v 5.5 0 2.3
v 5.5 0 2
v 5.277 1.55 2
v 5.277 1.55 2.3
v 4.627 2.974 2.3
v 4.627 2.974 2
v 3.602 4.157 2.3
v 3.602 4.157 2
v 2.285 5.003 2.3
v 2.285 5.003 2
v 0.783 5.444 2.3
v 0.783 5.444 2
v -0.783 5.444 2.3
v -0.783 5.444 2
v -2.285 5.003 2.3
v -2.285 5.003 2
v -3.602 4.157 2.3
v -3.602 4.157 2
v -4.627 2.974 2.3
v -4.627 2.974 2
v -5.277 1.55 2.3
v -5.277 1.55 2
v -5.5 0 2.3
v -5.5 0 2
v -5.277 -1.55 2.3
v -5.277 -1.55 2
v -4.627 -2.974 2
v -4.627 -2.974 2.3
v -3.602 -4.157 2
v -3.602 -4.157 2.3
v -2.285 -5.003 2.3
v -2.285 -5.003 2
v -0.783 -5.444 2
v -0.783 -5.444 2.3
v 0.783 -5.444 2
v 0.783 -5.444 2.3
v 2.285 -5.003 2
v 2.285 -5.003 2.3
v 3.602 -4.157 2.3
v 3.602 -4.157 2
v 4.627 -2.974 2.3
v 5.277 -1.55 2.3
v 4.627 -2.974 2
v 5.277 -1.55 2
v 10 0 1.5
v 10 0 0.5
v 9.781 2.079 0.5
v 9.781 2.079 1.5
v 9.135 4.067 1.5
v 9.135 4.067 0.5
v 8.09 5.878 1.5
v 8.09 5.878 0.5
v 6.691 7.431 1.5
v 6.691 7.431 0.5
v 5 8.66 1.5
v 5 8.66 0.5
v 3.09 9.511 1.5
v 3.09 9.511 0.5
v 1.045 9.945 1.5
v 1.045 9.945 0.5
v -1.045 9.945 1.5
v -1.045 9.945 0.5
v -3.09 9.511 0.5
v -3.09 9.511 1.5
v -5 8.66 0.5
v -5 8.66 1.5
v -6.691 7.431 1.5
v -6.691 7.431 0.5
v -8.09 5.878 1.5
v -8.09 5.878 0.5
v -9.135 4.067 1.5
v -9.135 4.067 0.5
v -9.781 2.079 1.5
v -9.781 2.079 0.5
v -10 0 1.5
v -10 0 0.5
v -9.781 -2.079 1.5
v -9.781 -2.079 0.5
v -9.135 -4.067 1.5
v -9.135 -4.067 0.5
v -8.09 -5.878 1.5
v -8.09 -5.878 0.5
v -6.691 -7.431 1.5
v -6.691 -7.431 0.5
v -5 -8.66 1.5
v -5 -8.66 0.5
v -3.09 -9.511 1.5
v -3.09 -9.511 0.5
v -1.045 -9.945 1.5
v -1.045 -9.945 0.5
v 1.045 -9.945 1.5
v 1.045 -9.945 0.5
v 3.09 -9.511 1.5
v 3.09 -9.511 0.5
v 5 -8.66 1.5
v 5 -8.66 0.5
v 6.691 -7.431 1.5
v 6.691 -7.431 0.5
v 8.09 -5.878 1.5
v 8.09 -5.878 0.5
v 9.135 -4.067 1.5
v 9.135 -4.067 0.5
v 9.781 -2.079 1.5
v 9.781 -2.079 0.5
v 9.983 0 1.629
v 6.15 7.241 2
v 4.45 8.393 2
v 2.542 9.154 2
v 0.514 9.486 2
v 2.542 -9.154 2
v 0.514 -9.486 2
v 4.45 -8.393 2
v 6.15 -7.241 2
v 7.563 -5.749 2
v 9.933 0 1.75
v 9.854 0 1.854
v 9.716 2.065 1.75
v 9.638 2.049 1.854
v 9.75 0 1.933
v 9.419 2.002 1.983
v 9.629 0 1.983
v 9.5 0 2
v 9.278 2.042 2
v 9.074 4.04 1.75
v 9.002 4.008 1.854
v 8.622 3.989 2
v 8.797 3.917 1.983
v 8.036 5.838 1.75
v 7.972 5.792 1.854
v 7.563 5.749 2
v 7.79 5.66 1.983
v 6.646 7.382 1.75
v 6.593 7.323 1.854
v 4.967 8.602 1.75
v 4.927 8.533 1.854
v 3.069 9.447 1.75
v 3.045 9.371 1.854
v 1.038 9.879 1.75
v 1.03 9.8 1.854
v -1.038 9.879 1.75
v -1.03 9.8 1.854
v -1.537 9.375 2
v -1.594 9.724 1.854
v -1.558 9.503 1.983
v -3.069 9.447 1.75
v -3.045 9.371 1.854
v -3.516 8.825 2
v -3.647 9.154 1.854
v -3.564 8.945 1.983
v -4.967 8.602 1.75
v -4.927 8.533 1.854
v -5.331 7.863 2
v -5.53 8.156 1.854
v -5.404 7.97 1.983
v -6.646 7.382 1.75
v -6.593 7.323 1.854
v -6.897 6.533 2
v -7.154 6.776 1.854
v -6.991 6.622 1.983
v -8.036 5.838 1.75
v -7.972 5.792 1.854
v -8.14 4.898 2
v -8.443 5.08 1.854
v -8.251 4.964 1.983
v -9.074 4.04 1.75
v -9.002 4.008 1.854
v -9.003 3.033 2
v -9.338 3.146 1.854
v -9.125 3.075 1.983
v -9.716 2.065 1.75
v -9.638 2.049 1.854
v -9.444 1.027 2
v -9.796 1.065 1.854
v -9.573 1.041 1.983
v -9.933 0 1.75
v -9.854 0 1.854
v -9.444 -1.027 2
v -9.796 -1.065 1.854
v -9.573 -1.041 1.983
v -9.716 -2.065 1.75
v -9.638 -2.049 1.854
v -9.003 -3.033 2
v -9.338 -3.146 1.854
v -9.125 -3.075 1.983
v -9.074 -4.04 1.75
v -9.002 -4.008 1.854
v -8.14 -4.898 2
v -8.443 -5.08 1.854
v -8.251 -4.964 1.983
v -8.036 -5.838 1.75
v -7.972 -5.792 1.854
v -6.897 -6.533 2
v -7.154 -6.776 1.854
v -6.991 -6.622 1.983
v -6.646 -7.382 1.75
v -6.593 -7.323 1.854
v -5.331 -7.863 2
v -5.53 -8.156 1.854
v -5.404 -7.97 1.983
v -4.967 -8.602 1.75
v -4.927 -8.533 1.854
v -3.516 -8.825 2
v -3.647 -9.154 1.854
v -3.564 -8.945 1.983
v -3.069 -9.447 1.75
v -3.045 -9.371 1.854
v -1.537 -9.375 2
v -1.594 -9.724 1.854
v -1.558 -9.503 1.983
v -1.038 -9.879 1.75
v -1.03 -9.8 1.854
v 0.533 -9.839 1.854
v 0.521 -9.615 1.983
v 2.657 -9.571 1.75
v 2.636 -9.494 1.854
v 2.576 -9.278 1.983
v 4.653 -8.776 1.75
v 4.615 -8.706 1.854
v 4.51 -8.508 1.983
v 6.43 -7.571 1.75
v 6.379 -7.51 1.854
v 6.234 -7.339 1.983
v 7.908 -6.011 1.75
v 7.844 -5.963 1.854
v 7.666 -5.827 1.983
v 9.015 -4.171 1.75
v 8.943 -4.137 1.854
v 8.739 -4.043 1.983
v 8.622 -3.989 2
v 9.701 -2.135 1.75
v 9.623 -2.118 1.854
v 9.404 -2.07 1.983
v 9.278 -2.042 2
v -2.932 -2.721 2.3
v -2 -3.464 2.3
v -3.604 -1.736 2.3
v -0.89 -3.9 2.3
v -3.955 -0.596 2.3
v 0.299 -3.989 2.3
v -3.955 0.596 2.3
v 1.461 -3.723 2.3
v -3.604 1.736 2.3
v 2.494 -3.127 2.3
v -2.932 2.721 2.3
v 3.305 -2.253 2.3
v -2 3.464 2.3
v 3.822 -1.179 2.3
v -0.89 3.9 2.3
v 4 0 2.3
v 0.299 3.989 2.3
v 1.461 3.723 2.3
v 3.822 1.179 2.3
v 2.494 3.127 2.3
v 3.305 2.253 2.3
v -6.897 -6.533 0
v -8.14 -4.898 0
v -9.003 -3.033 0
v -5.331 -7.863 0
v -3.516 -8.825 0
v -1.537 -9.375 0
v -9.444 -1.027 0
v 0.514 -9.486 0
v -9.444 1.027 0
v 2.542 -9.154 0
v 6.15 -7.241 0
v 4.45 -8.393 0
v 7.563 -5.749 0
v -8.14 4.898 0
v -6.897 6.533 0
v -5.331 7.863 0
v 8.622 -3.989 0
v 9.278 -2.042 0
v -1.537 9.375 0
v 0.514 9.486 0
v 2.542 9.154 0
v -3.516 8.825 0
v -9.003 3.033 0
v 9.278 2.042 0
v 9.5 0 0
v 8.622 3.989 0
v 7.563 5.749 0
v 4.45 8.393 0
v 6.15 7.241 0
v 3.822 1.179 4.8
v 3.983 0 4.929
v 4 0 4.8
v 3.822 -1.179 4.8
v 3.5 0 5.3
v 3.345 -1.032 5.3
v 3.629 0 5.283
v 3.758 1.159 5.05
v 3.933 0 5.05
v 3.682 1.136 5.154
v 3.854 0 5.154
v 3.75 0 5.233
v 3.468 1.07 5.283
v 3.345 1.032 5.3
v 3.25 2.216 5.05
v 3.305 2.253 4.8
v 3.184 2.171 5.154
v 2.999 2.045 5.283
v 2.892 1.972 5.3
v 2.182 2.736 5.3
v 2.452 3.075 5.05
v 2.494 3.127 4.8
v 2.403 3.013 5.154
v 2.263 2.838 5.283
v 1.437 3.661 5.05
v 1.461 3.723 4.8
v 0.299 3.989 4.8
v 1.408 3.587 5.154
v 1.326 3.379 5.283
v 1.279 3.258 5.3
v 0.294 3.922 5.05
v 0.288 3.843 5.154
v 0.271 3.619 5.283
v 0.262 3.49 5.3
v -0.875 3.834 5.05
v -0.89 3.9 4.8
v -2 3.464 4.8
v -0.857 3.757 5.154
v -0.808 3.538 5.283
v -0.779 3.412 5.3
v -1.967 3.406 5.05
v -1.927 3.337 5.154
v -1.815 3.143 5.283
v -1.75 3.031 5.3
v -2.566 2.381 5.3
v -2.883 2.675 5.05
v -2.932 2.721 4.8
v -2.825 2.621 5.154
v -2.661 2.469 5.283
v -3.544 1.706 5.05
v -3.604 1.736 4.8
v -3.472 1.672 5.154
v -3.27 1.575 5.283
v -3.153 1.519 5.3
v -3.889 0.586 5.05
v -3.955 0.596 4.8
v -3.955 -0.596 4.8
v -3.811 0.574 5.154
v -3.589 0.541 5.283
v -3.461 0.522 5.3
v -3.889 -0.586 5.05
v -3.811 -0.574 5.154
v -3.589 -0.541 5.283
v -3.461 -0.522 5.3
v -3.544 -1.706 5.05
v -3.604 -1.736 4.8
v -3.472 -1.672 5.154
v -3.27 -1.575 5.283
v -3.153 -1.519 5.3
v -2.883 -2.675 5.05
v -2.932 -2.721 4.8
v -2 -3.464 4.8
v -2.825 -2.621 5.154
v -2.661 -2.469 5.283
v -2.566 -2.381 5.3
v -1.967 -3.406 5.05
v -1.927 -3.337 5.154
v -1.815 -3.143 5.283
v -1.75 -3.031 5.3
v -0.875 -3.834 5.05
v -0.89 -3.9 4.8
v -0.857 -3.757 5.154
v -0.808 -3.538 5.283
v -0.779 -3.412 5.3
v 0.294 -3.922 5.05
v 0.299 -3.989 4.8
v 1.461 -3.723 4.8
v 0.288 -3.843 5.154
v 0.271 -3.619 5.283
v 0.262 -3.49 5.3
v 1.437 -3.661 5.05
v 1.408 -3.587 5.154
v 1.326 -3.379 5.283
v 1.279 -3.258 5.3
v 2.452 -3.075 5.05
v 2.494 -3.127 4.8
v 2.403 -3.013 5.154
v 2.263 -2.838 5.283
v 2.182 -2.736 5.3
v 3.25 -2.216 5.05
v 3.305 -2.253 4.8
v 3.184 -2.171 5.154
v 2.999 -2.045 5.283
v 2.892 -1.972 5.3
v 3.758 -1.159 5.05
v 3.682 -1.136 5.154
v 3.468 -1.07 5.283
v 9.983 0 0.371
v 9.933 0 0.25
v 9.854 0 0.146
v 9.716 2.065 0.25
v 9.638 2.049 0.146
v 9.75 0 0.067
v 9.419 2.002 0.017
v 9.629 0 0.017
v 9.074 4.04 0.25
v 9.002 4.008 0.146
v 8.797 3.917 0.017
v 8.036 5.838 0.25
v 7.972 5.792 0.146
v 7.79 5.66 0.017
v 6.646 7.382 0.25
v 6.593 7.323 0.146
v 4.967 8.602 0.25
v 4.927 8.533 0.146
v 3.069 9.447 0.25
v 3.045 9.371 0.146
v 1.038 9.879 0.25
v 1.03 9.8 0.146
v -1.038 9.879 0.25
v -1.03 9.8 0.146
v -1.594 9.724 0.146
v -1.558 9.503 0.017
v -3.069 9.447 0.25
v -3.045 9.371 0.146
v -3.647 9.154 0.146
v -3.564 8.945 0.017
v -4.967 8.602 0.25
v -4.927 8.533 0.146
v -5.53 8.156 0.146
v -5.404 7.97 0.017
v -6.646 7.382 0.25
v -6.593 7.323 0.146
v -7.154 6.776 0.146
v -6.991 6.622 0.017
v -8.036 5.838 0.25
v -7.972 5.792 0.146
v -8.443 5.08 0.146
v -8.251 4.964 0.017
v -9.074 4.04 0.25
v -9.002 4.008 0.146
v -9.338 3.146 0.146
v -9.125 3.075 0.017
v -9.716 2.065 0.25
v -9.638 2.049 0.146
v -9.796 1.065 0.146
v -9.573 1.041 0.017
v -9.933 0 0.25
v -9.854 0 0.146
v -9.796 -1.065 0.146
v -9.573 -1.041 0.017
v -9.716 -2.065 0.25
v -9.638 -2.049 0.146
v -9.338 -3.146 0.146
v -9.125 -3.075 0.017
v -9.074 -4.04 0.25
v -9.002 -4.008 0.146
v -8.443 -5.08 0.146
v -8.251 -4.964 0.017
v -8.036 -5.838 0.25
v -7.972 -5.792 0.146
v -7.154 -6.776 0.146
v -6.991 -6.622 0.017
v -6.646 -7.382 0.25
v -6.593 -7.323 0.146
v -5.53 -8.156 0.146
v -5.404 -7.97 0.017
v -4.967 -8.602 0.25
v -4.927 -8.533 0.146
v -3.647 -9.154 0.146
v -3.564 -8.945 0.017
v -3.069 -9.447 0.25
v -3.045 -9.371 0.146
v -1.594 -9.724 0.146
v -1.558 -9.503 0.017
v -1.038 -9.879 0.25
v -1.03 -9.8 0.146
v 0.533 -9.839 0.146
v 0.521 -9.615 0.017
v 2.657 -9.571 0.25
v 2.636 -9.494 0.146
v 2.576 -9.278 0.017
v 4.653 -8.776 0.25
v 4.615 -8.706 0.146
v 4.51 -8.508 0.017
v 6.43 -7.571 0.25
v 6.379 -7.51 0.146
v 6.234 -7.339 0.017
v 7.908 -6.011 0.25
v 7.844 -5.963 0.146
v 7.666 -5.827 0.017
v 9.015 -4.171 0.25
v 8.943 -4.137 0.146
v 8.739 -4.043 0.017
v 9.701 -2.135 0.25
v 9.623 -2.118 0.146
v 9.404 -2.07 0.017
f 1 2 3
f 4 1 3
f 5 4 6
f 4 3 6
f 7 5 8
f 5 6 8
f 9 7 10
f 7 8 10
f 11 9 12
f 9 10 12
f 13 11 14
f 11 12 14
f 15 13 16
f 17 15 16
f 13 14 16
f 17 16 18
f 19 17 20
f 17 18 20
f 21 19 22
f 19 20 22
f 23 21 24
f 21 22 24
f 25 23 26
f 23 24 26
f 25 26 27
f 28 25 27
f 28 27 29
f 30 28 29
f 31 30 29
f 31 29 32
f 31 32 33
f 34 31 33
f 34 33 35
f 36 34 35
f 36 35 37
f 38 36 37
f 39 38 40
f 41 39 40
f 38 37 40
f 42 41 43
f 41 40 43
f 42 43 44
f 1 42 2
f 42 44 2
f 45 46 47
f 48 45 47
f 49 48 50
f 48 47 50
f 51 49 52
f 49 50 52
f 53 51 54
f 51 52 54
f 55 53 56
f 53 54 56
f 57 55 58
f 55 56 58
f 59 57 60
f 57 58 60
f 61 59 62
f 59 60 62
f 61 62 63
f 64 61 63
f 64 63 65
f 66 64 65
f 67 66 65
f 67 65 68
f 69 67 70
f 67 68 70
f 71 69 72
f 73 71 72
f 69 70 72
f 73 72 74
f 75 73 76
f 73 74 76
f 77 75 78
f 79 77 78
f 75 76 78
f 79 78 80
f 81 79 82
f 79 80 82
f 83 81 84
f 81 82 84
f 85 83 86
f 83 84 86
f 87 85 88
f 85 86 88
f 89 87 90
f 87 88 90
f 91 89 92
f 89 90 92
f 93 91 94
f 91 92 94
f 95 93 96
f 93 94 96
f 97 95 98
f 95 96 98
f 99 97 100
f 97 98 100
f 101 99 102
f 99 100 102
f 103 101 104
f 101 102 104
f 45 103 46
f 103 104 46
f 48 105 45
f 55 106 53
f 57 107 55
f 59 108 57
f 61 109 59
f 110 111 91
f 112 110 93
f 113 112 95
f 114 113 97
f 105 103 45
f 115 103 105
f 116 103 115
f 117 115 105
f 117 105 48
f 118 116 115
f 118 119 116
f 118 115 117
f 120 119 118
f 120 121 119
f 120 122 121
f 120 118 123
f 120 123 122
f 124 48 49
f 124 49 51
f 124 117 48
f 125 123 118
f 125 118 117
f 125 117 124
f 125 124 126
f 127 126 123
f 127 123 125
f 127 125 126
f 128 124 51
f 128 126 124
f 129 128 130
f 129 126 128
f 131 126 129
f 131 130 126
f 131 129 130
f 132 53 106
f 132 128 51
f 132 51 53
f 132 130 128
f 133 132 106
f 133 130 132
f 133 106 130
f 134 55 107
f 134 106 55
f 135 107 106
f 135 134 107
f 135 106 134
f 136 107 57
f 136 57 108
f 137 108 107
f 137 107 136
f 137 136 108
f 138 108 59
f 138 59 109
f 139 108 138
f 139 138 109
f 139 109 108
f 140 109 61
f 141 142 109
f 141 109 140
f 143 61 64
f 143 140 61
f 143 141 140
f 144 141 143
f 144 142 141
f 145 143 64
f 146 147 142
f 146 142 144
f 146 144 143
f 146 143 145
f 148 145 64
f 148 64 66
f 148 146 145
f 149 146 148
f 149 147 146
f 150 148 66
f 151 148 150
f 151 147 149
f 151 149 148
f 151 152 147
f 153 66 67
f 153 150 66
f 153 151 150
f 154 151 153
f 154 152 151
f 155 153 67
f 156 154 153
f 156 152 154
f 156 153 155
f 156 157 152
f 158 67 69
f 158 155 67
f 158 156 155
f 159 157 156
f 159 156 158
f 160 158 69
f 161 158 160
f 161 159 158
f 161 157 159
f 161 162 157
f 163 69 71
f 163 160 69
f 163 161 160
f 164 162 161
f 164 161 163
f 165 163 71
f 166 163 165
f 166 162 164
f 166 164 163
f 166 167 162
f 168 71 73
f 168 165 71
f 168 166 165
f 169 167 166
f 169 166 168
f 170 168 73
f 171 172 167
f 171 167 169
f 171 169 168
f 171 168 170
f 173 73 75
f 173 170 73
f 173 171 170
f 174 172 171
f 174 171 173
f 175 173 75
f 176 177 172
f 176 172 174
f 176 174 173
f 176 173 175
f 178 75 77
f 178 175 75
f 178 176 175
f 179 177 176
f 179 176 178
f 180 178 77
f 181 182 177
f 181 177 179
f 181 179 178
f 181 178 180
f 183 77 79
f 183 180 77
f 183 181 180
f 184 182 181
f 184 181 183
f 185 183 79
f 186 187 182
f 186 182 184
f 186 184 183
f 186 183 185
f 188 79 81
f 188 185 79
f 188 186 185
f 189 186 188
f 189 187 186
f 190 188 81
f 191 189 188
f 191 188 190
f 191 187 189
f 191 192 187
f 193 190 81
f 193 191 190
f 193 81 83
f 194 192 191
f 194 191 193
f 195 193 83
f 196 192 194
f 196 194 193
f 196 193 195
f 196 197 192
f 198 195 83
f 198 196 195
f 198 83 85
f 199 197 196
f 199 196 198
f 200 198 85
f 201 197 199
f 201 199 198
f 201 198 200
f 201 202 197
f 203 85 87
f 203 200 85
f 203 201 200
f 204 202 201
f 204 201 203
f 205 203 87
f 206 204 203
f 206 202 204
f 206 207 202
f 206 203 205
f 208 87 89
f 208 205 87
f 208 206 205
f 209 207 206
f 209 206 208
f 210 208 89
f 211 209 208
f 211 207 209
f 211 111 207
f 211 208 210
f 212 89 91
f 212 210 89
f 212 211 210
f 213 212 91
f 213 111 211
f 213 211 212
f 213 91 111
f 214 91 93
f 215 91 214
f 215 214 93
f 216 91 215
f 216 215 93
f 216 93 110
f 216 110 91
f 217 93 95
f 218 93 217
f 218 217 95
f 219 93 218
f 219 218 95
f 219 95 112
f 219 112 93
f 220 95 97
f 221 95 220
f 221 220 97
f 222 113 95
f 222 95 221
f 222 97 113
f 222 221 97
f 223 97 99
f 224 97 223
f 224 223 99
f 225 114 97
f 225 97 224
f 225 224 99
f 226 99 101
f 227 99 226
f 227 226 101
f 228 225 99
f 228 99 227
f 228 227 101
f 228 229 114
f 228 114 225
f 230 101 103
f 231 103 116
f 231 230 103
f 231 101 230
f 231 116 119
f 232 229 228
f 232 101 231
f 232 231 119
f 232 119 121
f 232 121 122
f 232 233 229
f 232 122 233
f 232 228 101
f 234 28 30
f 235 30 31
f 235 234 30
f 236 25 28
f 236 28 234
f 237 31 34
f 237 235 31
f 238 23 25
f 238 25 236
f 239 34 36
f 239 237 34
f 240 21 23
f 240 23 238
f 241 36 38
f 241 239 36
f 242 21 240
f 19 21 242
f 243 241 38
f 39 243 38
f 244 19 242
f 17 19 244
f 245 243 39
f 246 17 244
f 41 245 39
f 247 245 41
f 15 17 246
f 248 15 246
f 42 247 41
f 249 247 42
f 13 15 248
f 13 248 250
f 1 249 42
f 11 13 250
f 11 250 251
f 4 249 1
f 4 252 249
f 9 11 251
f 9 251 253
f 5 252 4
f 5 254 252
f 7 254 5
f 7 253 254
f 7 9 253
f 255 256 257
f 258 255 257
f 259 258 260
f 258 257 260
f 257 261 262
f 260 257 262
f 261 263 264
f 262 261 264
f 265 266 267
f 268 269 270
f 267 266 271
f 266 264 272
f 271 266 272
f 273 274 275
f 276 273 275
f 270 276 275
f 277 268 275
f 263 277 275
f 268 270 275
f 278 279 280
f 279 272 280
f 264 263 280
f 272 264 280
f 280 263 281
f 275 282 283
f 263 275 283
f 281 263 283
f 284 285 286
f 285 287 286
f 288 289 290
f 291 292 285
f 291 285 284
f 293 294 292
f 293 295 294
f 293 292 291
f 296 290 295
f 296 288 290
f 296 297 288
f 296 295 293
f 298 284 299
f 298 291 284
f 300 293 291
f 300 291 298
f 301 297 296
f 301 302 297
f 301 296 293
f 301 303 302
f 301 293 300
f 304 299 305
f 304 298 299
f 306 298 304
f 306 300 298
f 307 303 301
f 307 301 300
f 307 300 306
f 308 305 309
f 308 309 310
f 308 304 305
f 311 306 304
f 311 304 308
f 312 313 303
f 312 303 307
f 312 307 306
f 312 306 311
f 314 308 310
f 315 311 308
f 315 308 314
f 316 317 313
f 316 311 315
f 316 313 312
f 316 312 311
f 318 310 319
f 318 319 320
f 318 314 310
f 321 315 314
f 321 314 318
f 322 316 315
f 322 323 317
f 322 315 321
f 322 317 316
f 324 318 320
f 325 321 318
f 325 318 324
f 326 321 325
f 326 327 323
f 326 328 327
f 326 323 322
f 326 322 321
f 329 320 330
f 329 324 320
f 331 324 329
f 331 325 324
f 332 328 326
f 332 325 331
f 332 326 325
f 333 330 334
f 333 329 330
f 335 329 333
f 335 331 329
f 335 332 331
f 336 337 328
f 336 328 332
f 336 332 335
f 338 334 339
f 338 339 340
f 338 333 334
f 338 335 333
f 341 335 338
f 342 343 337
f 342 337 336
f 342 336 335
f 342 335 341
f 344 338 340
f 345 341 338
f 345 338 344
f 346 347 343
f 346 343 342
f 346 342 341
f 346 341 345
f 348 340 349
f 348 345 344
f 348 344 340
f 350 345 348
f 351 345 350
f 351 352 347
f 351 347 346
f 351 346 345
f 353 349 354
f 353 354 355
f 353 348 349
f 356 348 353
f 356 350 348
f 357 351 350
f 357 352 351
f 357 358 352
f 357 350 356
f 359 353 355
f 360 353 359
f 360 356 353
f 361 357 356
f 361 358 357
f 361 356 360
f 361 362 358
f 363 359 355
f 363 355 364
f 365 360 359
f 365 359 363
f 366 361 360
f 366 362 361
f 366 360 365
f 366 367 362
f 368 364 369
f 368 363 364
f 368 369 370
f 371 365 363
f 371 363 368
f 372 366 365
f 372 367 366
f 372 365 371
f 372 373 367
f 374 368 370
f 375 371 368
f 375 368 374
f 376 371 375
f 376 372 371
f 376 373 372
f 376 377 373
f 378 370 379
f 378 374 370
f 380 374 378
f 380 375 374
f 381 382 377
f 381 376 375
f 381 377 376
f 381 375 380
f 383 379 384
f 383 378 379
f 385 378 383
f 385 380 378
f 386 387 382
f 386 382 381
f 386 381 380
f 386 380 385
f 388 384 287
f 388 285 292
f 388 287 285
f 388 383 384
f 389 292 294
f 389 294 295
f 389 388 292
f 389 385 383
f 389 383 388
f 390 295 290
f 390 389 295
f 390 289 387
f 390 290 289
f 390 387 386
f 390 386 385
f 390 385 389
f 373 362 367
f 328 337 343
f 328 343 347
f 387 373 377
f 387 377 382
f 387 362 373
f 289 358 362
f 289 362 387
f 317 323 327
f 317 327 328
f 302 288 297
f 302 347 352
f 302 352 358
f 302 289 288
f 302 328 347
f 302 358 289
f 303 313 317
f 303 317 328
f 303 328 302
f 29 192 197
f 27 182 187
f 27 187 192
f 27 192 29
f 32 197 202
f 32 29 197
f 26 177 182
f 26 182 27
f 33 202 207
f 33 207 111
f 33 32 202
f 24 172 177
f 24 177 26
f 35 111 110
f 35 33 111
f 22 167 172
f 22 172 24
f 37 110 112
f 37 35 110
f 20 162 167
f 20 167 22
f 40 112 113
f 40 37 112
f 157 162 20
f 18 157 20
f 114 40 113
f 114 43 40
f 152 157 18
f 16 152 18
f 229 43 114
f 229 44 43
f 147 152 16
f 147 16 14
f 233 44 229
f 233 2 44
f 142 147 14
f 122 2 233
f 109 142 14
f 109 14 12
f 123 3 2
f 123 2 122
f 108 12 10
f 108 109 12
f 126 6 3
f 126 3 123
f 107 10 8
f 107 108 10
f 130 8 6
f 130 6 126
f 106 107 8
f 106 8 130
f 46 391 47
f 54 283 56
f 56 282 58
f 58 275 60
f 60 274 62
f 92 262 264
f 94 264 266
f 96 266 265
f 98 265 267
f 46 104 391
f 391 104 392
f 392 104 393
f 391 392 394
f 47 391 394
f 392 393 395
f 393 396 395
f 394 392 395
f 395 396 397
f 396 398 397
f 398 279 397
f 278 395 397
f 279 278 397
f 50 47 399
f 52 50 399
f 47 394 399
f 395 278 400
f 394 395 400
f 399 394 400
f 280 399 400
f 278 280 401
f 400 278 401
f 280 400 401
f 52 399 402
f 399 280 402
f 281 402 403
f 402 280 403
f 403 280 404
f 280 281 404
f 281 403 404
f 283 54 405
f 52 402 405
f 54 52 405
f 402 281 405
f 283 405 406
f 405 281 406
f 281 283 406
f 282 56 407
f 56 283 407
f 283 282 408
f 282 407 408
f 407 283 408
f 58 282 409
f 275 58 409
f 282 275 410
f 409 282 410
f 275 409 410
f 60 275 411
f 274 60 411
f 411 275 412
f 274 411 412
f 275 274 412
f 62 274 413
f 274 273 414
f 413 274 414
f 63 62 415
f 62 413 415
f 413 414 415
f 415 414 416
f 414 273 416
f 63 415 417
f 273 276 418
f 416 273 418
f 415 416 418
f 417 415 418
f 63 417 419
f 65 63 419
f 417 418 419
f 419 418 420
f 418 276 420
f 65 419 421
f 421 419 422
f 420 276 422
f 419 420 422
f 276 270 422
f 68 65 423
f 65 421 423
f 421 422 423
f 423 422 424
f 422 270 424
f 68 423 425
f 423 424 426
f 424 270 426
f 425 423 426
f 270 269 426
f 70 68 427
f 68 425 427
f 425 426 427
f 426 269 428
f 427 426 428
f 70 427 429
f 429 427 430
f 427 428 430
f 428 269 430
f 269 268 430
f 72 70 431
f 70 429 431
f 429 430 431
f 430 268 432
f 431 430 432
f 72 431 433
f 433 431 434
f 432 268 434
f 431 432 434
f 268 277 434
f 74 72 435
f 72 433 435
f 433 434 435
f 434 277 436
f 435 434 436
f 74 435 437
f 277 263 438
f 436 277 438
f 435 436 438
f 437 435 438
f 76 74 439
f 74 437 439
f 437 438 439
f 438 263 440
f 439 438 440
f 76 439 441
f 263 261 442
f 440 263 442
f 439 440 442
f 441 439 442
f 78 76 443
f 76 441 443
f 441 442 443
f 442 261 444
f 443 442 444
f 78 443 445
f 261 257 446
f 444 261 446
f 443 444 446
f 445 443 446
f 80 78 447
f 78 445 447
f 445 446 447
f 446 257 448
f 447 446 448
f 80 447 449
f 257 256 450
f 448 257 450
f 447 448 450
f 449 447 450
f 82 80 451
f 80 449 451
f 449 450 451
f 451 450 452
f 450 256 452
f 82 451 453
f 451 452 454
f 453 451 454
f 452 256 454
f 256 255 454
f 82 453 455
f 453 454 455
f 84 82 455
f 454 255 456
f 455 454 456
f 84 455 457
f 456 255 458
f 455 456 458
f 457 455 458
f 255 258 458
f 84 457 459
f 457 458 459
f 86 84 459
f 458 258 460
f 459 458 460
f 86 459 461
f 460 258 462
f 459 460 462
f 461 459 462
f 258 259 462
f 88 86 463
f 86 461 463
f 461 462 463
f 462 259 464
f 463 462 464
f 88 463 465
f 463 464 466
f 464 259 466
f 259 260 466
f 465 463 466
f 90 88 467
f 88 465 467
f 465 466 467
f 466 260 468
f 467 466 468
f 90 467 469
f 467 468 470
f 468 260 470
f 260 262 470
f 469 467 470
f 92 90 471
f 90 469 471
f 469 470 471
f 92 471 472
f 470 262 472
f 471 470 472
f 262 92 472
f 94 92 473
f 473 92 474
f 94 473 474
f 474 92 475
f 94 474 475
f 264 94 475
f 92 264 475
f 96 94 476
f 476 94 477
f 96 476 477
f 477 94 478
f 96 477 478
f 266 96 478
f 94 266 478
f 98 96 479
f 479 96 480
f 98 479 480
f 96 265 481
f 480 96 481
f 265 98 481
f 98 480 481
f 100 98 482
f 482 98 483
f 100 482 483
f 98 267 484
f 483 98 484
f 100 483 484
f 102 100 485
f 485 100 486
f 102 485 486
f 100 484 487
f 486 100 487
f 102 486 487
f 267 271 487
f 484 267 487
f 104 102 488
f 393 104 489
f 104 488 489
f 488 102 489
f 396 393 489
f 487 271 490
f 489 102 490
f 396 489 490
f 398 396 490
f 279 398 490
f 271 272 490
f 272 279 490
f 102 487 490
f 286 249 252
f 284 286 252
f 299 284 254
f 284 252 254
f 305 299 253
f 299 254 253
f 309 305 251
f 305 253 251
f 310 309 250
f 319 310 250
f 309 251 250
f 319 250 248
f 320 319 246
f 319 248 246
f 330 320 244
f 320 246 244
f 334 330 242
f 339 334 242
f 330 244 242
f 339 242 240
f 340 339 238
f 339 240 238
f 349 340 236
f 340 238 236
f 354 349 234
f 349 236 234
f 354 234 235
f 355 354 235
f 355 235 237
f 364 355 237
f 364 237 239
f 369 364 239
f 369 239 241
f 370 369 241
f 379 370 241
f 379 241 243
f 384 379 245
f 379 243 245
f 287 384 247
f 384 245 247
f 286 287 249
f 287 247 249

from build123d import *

# Parameters (mm, degrees)
F0_R     = 10
F1_DEPTH = 2
F2_R     = 5.5
F3_DEPTH = 0.3
F4_R     = 4
F5_DEPTH = 3
F6_R     = 0.5


with BuildPart() as f1:
    # F0 (on Top) → F1 (new body)
    with BuildSketch(Plane.XY):
        Circle(F0_R)
    extrude(amount=F1_DEPTH)

    # F2 (on face) → F3 (join)
    with BuildSketch(Plane.XY.offset(2)):
        Circle(F2_R)
    extrude(amount=F3_DEPTH)

    # F4 (on face) → F5 (join)
    with BuildSketch(Plane.XY.offset(2.3)):
        Circle(F4_R)
    extrude(amount=F5_DEPTH)

    # F6
    f6_edges = [f1.edges().sort_by_distance(p)[0] for p in [
        (-4, 0, 5.3),
        (-10, 0, 2),
        (-10, 0, 0),
    ]]
    fillet(f6_edges, radius=F6_R)


solid = f1.part
